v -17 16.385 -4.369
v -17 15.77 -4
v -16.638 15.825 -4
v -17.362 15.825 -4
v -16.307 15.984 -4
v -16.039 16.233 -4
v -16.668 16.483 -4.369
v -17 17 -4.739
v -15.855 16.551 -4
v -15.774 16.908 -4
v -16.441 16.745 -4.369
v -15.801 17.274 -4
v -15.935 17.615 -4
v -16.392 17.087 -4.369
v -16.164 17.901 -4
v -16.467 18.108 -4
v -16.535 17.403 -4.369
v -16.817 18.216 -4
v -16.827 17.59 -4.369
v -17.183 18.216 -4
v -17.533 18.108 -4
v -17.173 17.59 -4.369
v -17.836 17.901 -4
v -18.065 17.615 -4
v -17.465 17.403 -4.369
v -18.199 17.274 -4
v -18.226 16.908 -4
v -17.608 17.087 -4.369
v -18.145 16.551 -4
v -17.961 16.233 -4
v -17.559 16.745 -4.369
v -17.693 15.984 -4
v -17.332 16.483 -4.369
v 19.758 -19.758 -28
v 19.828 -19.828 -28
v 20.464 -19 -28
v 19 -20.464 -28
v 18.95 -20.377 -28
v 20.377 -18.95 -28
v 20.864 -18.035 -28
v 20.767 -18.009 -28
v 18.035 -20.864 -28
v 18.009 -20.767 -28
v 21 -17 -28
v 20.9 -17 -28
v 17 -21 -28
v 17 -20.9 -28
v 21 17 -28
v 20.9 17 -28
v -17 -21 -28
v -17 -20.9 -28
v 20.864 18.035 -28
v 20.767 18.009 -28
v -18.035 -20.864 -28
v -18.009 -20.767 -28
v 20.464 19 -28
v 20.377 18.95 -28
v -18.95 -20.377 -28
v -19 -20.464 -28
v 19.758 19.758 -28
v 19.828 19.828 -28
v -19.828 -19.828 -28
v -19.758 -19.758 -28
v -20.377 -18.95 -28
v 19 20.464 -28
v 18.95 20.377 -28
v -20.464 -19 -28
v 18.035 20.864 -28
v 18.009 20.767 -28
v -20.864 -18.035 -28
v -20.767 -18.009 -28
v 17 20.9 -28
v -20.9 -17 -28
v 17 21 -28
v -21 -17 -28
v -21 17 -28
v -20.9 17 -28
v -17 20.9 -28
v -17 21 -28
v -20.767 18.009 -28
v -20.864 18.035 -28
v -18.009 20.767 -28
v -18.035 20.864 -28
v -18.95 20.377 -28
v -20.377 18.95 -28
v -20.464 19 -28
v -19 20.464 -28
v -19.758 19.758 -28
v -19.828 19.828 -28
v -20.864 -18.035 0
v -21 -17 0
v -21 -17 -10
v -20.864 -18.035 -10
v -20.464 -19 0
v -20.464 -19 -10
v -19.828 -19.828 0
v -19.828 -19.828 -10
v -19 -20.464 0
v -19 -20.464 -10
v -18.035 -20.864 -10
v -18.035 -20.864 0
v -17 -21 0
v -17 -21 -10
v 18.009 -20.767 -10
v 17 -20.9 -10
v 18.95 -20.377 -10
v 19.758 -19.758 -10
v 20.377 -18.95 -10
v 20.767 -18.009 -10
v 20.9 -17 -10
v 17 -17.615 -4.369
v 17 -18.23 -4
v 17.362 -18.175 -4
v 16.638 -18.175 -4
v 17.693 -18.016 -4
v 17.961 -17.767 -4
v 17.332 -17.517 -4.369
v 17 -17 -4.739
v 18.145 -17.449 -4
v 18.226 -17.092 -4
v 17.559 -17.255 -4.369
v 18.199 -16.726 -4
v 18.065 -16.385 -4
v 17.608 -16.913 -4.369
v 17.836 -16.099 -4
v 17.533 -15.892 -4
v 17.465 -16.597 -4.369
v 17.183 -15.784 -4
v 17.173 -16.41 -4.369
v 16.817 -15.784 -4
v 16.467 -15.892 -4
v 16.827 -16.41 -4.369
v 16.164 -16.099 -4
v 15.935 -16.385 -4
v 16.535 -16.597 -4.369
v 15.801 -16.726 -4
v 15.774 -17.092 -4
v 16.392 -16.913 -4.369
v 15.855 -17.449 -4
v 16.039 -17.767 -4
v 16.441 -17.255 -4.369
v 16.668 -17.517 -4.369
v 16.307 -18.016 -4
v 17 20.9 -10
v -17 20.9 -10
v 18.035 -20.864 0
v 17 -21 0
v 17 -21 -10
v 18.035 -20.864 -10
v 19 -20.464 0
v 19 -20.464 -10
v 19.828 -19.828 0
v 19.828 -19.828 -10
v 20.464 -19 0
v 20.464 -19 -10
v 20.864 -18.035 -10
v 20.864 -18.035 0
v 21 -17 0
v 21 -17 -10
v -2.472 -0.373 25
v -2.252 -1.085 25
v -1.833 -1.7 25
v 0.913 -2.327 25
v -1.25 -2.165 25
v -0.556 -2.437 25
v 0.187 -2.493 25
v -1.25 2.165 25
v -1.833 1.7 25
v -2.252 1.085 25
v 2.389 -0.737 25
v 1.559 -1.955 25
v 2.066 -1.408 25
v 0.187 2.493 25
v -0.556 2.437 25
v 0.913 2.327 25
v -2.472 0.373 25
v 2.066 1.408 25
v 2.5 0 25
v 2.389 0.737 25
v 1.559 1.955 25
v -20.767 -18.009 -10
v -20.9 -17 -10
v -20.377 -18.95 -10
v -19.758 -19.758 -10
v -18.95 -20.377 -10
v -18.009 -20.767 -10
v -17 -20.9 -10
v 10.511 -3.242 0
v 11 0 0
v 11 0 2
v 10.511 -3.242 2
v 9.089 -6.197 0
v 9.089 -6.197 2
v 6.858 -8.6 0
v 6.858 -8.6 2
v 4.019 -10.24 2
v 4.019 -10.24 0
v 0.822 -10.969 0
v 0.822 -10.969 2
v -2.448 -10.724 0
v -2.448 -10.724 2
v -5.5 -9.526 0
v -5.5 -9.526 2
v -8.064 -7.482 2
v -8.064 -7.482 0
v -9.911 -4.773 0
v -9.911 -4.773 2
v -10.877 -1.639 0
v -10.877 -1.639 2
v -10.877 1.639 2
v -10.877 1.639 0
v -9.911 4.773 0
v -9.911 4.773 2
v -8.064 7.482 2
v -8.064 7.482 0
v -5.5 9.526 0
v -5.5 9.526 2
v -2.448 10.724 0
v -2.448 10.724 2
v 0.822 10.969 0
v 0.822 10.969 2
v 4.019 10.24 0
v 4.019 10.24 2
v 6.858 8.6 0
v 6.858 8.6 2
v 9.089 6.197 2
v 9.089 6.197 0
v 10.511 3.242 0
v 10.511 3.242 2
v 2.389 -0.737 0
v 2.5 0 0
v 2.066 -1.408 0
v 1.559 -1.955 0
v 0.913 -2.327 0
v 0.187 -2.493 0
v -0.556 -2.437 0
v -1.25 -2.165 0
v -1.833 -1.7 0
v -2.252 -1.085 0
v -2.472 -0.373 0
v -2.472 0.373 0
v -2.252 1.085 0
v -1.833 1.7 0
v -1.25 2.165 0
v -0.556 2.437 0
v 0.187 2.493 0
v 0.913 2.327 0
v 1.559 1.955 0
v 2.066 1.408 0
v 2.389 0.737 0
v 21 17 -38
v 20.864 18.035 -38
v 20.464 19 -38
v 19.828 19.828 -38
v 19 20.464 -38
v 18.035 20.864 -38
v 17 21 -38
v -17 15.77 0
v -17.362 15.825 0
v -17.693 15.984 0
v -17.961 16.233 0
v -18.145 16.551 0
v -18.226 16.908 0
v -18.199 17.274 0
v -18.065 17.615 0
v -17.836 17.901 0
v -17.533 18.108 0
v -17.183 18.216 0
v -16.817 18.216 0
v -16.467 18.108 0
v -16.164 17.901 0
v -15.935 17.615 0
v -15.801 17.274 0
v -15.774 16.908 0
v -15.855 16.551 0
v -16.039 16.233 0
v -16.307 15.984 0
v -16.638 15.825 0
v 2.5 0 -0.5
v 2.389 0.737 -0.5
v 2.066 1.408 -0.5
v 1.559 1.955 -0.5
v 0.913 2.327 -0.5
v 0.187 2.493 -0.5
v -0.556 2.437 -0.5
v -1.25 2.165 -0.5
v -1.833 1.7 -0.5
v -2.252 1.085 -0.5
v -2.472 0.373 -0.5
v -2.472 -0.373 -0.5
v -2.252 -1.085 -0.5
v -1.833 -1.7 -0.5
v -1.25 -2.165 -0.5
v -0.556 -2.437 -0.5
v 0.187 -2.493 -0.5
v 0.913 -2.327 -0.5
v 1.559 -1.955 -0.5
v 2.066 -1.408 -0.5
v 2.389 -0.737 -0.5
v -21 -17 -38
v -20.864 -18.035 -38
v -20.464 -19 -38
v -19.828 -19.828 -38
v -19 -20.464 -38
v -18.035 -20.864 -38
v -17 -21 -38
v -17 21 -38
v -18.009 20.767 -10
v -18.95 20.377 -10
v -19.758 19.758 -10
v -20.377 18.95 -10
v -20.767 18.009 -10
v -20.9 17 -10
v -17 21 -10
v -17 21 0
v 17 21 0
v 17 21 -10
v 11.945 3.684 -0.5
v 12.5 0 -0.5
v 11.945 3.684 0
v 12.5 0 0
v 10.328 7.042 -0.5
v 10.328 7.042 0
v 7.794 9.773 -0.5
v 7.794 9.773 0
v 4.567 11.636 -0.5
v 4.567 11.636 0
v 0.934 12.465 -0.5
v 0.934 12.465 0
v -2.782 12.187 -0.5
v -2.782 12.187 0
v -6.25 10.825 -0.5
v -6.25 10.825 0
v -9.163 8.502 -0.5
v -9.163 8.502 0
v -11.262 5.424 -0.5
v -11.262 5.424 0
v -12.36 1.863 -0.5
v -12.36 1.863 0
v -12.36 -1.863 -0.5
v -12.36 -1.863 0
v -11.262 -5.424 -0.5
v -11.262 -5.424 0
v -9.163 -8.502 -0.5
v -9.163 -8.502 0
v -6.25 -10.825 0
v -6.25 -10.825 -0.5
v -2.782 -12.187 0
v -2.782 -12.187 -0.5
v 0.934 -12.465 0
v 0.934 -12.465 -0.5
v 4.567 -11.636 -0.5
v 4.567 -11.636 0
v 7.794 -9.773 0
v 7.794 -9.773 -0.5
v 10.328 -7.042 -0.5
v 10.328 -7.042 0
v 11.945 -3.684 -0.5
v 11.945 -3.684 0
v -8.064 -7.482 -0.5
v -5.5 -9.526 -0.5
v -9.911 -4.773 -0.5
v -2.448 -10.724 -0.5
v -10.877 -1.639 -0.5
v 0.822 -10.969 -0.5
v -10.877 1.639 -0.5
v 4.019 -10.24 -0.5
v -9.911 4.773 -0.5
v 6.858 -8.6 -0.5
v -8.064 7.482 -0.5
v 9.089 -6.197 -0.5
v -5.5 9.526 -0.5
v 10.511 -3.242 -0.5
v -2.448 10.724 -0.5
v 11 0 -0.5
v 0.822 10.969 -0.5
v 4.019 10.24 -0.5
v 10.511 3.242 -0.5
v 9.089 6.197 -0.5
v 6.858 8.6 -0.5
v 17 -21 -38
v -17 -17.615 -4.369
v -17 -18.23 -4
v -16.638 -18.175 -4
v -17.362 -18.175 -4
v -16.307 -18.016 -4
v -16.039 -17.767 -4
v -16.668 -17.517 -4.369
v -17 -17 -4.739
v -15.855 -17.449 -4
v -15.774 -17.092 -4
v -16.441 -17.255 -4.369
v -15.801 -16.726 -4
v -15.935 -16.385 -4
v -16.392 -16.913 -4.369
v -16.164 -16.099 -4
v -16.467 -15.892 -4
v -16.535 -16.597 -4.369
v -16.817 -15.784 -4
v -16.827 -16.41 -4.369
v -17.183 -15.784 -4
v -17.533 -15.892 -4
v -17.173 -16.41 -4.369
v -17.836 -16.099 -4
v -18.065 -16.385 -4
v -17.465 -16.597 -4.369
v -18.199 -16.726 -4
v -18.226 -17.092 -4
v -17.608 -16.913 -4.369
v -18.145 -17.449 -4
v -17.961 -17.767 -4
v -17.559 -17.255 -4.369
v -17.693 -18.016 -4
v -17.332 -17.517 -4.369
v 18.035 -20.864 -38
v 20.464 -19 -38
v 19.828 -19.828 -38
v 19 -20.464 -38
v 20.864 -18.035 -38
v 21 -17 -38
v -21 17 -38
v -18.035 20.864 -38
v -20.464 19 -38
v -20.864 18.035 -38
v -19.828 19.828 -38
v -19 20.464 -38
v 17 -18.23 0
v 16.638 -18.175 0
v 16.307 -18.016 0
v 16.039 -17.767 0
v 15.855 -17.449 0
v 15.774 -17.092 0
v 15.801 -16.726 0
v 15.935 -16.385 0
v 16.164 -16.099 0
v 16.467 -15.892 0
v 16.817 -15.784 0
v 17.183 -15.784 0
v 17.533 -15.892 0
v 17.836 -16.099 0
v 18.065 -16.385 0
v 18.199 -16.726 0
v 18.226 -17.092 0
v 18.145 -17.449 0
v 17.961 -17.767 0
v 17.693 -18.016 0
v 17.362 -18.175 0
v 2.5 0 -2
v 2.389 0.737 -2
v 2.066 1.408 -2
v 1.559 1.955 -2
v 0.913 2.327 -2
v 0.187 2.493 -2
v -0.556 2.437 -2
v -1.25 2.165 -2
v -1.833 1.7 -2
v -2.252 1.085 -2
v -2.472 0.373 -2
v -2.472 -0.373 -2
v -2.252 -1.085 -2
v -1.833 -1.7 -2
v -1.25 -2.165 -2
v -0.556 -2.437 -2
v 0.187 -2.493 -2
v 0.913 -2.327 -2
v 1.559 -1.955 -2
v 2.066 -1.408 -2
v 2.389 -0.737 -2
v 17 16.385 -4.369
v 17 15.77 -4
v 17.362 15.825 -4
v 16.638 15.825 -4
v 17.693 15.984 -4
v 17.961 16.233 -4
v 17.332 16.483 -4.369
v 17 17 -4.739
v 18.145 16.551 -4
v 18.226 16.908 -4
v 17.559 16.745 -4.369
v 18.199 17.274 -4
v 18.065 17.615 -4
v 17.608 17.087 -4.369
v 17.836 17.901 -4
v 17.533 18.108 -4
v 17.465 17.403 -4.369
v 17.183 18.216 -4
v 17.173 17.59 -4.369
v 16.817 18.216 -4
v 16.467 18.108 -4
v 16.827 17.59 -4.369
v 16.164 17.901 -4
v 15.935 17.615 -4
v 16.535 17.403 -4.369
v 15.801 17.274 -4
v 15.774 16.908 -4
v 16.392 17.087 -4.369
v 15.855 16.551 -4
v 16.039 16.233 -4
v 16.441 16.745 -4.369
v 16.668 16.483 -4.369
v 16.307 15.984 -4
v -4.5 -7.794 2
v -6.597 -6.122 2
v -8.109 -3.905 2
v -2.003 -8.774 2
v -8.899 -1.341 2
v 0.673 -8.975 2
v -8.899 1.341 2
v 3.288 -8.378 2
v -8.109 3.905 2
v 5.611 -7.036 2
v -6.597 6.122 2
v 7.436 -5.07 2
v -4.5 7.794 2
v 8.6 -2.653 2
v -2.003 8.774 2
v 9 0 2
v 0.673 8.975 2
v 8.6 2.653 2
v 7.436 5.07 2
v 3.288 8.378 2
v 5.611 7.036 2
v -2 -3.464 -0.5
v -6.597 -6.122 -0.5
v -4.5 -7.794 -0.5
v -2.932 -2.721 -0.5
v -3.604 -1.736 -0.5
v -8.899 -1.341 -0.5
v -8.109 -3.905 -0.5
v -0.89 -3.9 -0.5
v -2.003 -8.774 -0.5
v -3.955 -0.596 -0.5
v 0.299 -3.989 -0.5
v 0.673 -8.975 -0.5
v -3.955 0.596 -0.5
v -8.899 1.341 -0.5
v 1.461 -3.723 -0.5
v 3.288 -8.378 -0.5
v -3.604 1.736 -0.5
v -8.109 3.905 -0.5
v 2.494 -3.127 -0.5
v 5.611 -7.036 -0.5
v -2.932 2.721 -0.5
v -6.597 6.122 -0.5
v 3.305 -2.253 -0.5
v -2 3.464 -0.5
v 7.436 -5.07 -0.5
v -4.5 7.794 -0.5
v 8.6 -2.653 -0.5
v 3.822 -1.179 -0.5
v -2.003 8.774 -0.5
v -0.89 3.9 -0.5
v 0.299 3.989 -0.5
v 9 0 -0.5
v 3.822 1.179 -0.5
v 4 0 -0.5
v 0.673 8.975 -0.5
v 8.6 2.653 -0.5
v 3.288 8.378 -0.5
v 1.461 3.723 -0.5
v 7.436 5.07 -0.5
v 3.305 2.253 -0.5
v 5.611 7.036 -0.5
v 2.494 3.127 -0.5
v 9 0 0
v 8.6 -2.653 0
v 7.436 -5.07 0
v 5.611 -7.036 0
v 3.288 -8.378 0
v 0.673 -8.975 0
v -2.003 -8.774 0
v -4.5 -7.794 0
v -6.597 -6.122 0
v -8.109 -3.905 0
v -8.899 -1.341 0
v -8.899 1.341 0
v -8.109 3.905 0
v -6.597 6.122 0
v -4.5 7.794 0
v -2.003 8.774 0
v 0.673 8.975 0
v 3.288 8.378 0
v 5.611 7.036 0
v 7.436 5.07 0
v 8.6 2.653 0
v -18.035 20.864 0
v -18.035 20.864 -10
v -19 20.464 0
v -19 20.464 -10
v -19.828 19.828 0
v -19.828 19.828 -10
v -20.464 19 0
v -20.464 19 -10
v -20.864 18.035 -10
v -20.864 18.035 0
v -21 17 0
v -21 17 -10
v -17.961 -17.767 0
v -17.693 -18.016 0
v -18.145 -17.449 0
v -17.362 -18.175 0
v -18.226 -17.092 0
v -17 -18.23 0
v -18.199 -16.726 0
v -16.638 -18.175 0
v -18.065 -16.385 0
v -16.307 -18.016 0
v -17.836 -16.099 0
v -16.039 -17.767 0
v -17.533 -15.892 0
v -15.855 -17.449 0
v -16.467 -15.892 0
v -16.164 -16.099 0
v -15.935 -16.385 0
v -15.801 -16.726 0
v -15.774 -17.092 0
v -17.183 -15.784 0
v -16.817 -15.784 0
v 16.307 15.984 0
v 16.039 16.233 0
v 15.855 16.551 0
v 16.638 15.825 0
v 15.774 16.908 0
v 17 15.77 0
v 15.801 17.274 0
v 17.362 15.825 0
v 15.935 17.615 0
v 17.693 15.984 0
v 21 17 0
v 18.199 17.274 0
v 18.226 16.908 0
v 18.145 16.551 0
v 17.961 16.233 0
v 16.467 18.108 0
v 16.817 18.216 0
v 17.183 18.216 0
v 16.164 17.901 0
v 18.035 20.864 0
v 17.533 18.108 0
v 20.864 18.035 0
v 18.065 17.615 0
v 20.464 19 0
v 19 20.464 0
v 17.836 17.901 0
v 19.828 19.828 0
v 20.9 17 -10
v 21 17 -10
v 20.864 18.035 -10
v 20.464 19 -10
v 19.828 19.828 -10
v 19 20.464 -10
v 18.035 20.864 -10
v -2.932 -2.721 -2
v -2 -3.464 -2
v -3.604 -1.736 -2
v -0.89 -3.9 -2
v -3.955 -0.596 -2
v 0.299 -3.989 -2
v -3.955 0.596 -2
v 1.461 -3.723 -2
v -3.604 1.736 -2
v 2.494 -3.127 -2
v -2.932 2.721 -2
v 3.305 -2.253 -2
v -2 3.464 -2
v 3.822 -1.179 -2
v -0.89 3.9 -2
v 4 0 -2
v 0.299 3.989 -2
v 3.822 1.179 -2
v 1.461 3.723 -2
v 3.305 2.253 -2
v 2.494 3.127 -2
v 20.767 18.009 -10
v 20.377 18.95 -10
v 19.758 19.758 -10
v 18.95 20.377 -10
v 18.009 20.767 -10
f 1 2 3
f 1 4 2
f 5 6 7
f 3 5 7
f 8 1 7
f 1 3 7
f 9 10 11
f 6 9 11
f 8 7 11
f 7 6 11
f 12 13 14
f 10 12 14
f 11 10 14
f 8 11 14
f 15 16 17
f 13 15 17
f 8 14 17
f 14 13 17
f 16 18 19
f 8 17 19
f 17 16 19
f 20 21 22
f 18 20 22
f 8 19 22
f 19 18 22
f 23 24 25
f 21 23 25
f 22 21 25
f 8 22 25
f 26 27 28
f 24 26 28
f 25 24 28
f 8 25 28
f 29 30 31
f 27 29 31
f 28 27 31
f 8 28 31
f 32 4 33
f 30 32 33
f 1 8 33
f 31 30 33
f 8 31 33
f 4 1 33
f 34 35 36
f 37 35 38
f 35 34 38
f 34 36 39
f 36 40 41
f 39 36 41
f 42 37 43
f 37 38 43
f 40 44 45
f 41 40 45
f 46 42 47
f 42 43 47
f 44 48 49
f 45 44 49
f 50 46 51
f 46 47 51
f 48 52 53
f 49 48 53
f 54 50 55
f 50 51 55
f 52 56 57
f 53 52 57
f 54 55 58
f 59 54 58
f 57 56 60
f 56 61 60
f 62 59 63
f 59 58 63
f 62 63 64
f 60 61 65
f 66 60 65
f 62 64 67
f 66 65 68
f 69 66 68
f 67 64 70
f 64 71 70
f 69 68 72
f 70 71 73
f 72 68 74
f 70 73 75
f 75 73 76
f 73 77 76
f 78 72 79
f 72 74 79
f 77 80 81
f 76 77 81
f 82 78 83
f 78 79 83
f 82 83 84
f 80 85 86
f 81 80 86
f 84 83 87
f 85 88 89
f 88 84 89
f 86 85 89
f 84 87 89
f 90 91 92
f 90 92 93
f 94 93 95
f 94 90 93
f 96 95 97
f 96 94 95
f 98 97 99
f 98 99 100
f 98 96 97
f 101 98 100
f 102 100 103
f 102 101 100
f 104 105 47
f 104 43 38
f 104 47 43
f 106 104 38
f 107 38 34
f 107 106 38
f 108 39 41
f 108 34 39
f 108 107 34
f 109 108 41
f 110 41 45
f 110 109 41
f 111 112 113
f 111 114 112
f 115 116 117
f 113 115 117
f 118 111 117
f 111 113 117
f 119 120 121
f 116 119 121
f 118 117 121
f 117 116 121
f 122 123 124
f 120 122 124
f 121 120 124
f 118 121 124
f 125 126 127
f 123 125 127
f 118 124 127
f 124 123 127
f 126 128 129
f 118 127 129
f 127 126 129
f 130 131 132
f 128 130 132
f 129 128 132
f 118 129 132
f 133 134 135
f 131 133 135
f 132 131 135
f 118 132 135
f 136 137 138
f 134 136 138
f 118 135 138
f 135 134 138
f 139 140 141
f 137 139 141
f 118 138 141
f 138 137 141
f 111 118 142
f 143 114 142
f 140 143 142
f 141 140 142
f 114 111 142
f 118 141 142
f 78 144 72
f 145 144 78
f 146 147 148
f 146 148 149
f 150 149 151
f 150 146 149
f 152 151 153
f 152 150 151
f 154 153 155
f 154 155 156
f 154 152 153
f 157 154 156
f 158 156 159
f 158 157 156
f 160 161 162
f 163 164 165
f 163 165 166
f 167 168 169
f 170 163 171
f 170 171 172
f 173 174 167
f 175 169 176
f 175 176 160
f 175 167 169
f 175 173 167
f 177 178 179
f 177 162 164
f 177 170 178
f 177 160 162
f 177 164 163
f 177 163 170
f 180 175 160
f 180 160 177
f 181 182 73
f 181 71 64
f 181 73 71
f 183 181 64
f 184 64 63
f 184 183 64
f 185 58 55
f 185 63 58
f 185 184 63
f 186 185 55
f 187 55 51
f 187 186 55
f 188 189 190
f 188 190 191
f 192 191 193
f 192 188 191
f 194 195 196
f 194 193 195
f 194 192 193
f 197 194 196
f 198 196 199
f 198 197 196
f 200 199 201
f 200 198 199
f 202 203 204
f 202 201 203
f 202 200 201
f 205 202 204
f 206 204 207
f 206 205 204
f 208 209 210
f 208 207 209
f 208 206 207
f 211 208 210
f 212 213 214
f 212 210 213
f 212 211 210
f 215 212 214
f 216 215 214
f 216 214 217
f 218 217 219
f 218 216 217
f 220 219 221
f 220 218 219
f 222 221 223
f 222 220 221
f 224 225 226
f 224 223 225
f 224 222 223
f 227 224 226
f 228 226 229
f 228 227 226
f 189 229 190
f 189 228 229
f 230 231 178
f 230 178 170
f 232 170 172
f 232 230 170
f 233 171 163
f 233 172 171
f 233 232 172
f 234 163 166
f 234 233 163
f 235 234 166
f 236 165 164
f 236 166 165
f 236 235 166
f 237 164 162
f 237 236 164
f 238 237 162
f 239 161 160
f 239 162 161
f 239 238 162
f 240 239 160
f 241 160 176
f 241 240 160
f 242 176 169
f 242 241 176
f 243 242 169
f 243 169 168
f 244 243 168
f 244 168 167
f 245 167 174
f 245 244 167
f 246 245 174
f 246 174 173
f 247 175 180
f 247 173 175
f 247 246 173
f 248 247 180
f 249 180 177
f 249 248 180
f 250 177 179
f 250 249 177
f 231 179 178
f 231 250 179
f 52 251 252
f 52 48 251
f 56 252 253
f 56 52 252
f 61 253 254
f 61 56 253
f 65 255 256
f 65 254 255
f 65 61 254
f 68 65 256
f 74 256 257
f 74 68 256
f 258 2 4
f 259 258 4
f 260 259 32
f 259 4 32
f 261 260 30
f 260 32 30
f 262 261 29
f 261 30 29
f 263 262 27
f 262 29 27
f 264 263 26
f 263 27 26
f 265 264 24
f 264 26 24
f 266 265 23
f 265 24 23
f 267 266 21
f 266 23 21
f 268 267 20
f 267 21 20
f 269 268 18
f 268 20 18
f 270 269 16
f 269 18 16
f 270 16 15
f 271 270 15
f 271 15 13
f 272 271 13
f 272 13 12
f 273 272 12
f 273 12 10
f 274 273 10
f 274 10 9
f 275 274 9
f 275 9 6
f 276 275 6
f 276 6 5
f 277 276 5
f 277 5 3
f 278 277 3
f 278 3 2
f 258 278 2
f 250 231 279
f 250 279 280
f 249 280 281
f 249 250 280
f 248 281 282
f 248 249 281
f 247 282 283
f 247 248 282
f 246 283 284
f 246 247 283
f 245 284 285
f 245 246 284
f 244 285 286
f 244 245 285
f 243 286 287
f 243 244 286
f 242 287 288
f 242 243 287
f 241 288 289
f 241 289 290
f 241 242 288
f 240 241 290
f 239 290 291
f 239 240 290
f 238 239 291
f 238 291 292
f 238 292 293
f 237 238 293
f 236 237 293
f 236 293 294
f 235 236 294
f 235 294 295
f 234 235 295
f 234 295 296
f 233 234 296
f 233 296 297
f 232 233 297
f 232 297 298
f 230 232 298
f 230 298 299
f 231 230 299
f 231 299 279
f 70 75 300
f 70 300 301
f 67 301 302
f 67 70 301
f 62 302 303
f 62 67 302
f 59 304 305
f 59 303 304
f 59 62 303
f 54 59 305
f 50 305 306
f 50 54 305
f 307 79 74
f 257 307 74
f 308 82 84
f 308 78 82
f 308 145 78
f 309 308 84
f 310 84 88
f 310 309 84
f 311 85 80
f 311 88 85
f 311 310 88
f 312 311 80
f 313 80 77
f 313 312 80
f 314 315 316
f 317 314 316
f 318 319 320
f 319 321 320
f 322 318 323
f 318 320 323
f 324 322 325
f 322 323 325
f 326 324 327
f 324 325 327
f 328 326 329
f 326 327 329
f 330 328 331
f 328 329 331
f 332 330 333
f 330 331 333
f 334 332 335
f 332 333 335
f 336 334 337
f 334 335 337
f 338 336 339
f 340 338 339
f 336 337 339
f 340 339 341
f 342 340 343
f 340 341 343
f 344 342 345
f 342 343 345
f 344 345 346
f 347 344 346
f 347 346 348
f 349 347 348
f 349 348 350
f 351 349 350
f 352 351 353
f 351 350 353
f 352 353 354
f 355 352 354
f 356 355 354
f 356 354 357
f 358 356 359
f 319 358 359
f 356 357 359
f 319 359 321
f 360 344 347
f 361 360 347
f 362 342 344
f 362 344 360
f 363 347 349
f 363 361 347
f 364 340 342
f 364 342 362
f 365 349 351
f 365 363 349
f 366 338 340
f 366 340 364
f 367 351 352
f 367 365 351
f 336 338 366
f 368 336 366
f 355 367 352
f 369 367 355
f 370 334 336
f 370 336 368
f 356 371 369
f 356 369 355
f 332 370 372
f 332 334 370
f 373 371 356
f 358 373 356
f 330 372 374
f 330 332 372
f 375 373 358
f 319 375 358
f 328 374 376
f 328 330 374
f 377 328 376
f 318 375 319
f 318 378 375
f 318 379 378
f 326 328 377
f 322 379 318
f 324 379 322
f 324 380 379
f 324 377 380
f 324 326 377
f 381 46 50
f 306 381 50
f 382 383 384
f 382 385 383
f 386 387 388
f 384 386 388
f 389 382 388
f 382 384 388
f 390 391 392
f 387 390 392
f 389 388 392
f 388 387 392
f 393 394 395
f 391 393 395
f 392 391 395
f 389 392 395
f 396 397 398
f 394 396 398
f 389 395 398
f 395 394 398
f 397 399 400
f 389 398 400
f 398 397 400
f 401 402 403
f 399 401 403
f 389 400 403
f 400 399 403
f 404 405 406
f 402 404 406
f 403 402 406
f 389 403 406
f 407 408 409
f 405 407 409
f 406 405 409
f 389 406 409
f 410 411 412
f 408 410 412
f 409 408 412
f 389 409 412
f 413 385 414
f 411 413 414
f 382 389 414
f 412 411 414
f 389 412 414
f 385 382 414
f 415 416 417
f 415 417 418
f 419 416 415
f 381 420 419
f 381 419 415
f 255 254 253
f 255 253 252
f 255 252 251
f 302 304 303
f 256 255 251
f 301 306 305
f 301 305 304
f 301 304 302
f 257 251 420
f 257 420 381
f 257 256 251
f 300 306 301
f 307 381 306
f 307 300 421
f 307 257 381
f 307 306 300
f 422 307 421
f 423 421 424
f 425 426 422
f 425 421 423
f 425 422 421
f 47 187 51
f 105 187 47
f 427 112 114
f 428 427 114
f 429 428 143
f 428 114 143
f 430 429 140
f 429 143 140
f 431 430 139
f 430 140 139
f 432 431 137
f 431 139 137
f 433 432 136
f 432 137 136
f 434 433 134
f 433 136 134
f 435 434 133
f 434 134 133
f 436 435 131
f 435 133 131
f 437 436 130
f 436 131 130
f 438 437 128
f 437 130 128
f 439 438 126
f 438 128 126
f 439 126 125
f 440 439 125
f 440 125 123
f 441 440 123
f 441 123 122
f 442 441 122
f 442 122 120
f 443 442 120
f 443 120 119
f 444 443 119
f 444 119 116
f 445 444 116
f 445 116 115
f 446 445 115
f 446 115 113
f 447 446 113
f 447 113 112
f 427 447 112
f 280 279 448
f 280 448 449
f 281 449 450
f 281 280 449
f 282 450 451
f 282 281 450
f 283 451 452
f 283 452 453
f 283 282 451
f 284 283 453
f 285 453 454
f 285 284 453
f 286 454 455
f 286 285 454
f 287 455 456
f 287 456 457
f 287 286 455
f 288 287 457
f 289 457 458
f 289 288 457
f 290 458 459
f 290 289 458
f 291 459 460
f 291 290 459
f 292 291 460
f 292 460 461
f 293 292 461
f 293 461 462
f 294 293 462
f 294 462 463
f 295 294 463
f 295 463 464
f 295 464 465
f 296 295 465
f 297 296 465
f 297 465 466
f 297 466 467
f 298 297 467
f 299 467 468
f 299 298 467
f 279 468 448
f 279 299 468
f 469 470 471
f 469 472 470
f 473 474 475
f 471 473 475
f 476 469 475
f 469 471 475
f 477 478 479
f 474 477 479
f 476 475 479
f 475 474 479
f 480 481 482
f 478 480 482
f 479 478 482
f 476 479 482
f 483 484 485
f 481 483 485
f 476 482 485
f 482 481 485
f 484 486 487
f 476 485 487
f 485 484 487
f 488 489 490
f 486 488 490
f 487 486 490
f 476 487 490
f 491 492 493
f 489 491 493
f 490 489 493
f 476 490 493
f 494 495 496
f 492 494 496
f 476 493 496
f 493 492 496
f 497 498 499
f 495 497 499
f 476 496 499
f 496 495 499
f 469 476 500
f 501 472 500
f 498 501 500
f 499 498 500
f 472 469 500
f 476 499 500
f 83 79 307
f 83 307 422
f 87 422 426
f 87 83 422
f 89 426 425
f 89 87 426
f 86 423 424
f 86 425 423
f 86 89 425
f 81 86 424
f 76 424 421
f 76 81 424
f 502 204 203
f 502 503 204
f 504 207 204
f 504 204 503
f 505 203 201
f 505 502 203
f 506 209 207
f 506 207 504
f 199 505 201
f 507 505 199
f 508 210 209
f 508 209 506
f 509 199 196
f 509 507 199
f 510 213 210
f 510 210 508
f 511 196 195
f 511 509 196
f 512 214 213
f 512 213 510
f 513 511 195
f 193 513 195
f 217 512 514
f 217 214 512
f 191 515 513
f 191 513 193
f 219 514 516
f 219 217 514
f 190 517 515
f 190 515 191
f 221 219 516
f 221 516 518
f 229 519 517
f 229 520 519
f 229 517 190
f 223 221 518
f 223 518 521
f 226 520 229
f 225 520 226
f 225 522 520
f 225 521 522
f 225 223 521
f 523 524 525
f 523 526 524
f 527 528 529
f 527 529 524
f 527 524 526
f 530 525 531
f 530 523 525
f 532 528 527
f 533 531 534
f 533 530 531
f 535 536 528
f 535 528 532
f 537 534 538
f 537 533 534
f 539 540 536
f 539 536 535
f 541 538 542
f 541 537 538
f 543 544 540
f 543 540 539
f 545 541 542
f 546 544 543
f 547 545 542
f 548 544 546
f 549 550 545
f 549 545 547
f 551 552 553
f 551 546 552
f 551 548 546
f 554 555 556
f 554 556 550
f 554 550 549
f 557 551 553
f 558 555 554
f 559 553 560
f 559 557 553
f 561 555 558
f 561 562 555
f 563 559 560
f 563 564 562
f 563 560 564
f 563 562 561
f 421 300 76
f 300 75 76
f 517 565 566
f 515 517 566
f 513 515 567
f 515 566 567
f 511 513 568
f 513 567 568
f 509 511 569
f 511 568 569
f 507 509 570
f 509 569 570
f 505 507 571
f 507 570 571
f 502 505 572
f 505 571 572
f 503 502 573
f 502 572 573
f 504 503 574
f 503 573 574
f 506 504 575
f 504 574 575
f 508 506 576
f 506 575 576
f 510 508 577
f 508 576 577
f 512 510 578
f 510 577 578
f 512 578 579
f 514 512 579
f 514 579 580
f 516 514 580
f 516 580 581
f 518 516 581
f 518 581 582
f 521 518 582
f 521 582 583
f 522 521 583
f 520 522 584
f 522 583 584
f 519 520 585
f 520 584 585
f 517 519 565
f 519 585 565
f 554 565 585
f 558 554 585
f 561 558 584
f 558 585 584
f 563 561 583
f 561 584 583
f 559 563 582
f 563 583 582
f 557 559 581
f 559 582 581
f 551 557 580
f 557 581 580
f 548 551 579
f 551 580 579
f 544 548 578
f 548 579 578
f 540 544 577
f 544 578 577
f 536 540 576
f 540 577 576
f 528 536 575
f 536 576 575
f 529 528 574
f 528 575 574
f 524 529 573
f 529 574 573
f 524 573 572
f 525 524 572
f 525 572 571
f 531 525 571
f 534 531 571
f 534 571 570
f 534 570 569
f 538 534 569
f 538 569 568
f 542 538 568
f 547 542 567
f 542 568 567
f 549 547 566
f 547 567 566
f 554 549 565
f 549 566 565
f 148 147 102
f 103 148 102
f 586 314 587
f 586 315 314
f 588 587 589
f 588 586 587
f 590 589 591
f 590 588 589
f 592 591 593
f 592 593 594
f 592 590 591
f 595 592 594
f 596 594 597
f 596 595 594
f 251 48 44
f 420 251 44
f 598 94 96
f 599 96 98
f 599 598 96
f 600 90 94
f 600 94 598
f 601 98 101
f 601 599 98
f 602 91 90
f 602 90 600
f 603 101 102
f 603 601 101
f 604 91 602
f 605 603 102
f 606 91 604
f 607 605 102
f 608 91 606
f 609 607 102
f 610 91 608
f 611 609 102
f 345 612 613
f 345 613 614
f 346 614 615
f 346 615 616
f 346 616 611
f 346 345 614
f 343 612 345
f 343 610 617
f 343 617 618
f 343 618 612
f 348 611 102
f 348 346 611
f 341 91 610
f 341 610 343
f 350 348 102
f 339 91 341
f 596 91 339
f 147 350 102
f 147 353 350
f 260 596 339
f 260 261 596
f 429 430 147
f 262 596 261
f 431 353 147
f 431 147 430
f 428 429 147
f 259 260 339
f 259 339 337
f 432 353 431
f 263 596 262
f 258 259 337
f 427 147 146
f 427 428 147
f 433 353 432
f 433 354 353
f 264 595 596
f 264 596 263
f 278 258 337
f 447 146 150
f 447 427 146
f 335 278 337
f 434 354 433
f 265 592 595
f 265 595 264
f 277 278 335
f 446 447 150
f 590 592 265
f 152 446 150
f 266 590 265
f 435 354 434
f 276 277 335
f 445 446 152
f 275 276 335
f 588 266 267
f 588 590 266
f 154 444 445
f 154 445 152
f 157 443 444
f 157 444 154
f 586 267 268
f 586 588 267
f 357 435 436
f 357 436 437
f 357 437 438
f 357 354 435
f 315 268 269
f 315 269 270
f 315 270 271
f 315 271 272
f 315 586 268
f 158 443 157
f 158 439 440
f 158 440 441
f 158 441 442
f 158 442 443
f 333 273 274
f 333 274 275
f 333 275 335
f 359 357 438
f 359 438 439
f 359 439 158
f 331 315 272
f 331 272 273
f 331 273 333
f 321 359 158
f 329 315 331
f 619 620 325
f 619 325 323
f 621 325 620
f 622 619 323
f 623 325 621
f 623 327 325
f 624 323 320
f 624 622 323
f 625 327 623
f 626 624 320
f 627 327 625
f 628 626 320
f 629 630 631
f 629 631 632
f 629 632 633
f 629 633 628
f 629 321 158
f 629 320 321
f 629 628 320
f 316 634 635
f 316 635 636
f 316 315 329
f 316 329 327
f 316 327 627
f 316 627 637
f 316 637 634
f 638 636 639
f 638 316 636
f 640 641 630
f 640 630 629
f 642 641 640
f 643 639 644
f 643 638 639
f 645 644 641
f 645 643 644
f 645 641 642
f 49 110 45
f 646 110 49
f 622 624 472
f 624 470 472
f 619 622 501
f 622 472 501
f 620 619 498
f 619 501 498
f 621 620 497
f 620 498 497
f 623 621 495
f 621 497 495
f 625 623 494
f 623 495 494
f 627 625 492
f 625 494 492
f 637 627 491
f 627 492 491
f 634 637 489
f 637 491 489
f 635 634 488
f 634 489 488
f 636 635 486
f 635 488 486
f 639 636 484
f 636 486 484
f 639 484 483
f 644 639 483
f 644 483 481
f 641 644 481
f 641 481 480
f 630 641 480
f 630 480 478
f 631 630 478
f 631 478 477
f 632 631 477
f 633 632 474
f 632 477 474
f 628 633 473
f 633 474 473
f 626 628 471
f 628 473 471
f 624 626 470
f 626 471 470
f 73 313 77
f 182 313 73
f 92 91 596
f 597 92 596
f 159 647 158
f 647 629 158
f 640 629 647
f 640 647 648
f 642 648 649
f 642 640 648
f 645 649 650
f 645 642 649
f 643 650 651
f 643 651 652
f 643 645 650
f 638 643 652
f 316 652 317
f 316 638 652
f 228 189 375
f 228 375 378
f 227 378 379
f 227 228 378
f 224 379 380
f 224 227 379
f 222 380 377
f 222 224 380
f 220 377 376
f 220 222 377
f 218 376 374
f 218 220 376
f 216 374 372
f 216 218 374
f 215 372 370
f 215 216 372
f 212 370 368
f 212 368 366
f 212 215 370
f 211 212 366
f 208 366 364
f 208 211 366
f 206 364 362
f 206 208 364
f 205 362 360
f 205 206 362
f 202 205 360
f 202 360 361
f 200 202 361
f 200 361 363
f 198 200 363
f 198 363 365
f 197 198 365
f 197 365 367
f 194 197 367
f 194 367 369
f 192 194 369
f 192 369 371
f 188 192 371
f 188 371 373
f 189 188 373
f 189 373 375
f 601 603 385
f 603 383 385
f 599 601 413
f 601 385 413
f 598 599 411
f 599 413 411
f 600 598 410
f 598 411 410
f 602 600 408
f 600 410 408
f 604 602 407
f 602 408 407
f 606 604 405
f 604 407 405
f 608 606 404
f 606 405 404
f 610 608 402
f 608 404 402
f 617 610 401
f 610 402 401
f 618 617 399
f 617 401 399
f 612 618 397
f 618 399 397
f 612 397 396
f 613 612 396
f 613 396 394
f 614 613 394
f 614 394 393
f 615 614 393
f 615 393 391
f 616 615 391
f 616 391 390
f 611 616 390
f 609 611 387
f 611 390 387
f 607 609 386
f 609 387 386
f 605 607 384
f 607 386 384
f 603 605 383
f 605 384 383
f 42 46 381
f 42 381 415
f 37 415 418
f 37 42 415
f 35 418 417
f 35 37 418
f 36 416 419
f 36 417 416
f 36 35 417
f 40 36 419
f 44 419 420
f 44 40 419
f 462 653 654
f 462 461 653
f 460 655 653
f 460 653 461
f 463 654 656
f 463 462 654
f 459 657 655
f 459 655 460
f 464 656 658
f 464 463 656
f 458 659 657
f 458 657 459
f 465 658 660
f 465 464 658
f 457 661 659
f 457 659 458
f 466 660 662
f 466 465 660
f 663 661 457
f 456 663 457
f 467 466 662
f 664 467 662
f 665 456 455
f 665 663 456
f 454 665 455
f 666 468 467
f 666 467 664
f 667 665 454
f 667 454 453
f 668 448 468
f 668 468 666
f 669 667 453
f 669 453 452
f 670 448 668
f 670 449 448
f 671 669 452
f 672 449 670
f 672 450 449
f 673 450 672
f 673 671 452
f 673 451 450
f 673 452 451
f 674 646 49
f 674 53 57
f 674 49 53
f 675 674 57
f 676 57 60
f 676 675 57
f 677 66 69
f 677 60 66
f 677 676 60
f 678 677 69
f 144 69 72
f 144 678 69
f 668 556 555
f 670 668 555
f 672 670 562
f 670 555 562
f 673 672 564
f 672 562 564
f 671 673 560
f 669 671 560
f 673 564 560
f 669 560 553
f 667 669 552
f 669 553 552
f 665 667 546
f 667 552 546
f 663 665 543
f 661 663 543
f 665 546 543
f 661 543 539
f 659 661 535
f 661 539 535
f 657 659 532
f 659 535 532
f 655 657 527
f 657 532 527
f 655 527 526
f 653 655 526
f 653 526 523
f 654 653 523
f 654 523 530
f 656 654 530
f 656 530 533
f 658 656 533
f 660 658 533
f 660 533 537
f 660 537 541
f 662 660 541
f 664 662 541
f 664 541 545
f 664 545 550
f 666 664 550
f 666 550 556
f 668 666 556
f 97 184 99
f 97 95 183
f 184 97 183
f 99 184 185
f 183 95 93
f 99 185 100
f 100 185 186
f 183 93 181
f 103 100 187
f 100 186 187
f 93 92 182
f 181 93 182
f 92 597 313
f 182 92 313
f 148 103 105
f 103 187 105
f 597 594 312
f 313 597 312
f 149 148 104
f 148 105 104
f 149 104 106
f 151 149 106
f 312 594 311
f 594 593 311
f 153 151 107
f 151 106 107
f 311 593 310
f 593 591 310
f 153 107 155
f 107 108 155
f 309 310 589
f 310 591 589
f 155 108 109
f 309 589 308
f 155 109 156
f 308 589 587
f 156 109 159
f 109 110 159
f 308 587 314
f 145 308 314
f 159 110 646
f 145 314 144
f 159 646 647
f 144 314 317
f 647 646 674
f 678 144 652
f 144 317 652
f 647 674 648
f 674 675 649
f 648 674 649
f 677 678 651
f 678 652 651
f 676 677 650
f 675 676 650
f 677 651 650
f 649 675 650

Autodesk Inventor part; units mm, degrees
ref_plane "YZ Plane" through (0, 0, 0) normal (1, 0, 0) x (0, 1, 0)
sketch "Sketch1" plane through (0, 0, 0) normal (0, 0, 1) x (1, 0, 0)
  circle A0 centre (0, 0) radius 12.5
  circle A1 centre (0, 0) radius 9
  circle A2 centre (0, 0) radius 11
  line L0 (17, -21) -> (-17, -21)
  line L1 (-21, -17) -> (-21, 17)
  line L2 (-17, 21) -> (17, 21)
  line L3 (21, 17) -> (21, -17)
  line L4 (21, -21) -> (-21, 21) construction
  line L5 (-21, -21) -> (21, 21) construction
  arc A3 (-17, 21) -> (-21, 17) centre (-17, 17) ccw
  arc A4 (-21, -17) -> (-17, -21) centre (-17, -17) ccw
  arc A5 (17, -21) -> (21, -17) centre (17, -17) ccw
  arc A6 (21, 17) -> (17, 21) centre (17, 17) ccw
  line L6 (15.5, -15.5) -> (-15.5, -15.5) construction
  line L7 (-15.5, -15.5) -> (-15.5, 15.5) construction
  line L8 (-15.5, 15.5) -> (15.5, 15.5) construction
  line L9 (15.5, 15.5) -> (15.5, -15.5) construction
  line L10 (15.5, -15.5) -> (-15.5, 15.5) construction
  line L11 (-15.5, -15.5) -> (15.5, 15.5) construction
  circle A7 centre (0, 0) radius 2.5
  circle A8 centre (0, 0) radius 4
  dimension "d0" = 42
  dimension "d2" = 42
  dimension "d3" = 4
  dimension "d4" = 18
  dimension "d5" = 22
  dimension "d6" = 25
  dimension "d7" = 31
  dimension "d22" = 5
  dimension "d23" = 8
ref_plane "Work Plane1" through (0, 0, -10) normal (0, 0, 1) x (1, 0, 0)
ref_plane "Work Plane3" through (0, 0, -28) normal (0, 0, 1) x (1, 0, 0)
ref_plane "Work Plane2" through (0, 0, -38) normal (0, 0, 1) x (1, 0, 0)
extrude "Extrusion1" add sketch "Sketch1" against normal up to surface (10 mm away) from surface at 0 contours A0 | A1 | A2 | L0 A4 L1 A3 L2 A6 L3 A5 | A7 | A8
sketch "Sketch2" plane through (17, 21, -10) normal (0, 0, -1) x (-1, 0, 0)
  arc A0 (34, -42) -> (38, -38) centre (34, -38) ccw projected
  line L0 (38, -38) -> (38, -4) projected
  arc A1 (38, -4) -> (34, 0) centre (34, -4) ccw projected
  line L1 (34, 0) -> (0, 0) projected
  arc A2 (0, 0) -> (-4, -4) centre (0, -4) ccw projected
  line L2 (-4, -4) -> (-4, -38) projected
  arc A3 (-4, -38) -> (0, -42) centre (0, -38) ccw projected
  line L3 (0, -42) -> (34, -42) projected
  line L4 (0, -0.1) -> (34, -0.1)
  arc A4 (37.9, -4) -> (34, -0.1) centre (34, -4) ccw
  line L5 (37.9, -4) -> (37.9, -38)
  arc A5 (34, -41.9) -> (37.9, -38) centre (34, -38) ccw
  line L6 (34, -41.9) -> (0, -41.9)
  arc A6 (-3.9, -38) -> (0, -41.9) centre (0, -38) ccw
  line L7 (-3.9, -38) -> (-3.9, -4)
  arc A7 (0, -0.1) -> (-3.9, -4) centre (0, -4) ccw
  point P0 (17, -21)
  dimension "d13" = 0.1
extrude "Extrusion2" add sketch "Sketch2" along normal up to surface (10 mm away) from surface at 18 contours L3 A3 L2 A2 L1 A1 L0 A0 | L4 A4 L5 A5 L6 A6 L7 A7
extrude "Extrusion3" add sketch "Sketch2" along normal up to surface (18 mm away) from surface at 0 contours L4 A4 L5 A5 L6 A6 L7 A7
extrude "Extrusion4" cut sketch "Sketch1" against normal blind 0.5 contours A0 | A1 | A8
extrude "Extrusion5" add sketch "Sketch1" along normal blind 2 contours A2
extrude "Extrusion6" cut sketch "Sketch1" against normal blind 2 contours A8
extrude "Extrusion7" add sketch "Sketch1" along normal blind 25 contours A7
hole "Hole1" at (-17, 17, 0) at (-17, -17, 0) at (17, -17, 0) at (17, 17, 0) direction (0, 0, -1) diameter 2.459 depth 4 tip angle 118 thread size "M3x0.5" class "6H" standard "ISO Metric profile"
properties part number "nema17 38mm"
